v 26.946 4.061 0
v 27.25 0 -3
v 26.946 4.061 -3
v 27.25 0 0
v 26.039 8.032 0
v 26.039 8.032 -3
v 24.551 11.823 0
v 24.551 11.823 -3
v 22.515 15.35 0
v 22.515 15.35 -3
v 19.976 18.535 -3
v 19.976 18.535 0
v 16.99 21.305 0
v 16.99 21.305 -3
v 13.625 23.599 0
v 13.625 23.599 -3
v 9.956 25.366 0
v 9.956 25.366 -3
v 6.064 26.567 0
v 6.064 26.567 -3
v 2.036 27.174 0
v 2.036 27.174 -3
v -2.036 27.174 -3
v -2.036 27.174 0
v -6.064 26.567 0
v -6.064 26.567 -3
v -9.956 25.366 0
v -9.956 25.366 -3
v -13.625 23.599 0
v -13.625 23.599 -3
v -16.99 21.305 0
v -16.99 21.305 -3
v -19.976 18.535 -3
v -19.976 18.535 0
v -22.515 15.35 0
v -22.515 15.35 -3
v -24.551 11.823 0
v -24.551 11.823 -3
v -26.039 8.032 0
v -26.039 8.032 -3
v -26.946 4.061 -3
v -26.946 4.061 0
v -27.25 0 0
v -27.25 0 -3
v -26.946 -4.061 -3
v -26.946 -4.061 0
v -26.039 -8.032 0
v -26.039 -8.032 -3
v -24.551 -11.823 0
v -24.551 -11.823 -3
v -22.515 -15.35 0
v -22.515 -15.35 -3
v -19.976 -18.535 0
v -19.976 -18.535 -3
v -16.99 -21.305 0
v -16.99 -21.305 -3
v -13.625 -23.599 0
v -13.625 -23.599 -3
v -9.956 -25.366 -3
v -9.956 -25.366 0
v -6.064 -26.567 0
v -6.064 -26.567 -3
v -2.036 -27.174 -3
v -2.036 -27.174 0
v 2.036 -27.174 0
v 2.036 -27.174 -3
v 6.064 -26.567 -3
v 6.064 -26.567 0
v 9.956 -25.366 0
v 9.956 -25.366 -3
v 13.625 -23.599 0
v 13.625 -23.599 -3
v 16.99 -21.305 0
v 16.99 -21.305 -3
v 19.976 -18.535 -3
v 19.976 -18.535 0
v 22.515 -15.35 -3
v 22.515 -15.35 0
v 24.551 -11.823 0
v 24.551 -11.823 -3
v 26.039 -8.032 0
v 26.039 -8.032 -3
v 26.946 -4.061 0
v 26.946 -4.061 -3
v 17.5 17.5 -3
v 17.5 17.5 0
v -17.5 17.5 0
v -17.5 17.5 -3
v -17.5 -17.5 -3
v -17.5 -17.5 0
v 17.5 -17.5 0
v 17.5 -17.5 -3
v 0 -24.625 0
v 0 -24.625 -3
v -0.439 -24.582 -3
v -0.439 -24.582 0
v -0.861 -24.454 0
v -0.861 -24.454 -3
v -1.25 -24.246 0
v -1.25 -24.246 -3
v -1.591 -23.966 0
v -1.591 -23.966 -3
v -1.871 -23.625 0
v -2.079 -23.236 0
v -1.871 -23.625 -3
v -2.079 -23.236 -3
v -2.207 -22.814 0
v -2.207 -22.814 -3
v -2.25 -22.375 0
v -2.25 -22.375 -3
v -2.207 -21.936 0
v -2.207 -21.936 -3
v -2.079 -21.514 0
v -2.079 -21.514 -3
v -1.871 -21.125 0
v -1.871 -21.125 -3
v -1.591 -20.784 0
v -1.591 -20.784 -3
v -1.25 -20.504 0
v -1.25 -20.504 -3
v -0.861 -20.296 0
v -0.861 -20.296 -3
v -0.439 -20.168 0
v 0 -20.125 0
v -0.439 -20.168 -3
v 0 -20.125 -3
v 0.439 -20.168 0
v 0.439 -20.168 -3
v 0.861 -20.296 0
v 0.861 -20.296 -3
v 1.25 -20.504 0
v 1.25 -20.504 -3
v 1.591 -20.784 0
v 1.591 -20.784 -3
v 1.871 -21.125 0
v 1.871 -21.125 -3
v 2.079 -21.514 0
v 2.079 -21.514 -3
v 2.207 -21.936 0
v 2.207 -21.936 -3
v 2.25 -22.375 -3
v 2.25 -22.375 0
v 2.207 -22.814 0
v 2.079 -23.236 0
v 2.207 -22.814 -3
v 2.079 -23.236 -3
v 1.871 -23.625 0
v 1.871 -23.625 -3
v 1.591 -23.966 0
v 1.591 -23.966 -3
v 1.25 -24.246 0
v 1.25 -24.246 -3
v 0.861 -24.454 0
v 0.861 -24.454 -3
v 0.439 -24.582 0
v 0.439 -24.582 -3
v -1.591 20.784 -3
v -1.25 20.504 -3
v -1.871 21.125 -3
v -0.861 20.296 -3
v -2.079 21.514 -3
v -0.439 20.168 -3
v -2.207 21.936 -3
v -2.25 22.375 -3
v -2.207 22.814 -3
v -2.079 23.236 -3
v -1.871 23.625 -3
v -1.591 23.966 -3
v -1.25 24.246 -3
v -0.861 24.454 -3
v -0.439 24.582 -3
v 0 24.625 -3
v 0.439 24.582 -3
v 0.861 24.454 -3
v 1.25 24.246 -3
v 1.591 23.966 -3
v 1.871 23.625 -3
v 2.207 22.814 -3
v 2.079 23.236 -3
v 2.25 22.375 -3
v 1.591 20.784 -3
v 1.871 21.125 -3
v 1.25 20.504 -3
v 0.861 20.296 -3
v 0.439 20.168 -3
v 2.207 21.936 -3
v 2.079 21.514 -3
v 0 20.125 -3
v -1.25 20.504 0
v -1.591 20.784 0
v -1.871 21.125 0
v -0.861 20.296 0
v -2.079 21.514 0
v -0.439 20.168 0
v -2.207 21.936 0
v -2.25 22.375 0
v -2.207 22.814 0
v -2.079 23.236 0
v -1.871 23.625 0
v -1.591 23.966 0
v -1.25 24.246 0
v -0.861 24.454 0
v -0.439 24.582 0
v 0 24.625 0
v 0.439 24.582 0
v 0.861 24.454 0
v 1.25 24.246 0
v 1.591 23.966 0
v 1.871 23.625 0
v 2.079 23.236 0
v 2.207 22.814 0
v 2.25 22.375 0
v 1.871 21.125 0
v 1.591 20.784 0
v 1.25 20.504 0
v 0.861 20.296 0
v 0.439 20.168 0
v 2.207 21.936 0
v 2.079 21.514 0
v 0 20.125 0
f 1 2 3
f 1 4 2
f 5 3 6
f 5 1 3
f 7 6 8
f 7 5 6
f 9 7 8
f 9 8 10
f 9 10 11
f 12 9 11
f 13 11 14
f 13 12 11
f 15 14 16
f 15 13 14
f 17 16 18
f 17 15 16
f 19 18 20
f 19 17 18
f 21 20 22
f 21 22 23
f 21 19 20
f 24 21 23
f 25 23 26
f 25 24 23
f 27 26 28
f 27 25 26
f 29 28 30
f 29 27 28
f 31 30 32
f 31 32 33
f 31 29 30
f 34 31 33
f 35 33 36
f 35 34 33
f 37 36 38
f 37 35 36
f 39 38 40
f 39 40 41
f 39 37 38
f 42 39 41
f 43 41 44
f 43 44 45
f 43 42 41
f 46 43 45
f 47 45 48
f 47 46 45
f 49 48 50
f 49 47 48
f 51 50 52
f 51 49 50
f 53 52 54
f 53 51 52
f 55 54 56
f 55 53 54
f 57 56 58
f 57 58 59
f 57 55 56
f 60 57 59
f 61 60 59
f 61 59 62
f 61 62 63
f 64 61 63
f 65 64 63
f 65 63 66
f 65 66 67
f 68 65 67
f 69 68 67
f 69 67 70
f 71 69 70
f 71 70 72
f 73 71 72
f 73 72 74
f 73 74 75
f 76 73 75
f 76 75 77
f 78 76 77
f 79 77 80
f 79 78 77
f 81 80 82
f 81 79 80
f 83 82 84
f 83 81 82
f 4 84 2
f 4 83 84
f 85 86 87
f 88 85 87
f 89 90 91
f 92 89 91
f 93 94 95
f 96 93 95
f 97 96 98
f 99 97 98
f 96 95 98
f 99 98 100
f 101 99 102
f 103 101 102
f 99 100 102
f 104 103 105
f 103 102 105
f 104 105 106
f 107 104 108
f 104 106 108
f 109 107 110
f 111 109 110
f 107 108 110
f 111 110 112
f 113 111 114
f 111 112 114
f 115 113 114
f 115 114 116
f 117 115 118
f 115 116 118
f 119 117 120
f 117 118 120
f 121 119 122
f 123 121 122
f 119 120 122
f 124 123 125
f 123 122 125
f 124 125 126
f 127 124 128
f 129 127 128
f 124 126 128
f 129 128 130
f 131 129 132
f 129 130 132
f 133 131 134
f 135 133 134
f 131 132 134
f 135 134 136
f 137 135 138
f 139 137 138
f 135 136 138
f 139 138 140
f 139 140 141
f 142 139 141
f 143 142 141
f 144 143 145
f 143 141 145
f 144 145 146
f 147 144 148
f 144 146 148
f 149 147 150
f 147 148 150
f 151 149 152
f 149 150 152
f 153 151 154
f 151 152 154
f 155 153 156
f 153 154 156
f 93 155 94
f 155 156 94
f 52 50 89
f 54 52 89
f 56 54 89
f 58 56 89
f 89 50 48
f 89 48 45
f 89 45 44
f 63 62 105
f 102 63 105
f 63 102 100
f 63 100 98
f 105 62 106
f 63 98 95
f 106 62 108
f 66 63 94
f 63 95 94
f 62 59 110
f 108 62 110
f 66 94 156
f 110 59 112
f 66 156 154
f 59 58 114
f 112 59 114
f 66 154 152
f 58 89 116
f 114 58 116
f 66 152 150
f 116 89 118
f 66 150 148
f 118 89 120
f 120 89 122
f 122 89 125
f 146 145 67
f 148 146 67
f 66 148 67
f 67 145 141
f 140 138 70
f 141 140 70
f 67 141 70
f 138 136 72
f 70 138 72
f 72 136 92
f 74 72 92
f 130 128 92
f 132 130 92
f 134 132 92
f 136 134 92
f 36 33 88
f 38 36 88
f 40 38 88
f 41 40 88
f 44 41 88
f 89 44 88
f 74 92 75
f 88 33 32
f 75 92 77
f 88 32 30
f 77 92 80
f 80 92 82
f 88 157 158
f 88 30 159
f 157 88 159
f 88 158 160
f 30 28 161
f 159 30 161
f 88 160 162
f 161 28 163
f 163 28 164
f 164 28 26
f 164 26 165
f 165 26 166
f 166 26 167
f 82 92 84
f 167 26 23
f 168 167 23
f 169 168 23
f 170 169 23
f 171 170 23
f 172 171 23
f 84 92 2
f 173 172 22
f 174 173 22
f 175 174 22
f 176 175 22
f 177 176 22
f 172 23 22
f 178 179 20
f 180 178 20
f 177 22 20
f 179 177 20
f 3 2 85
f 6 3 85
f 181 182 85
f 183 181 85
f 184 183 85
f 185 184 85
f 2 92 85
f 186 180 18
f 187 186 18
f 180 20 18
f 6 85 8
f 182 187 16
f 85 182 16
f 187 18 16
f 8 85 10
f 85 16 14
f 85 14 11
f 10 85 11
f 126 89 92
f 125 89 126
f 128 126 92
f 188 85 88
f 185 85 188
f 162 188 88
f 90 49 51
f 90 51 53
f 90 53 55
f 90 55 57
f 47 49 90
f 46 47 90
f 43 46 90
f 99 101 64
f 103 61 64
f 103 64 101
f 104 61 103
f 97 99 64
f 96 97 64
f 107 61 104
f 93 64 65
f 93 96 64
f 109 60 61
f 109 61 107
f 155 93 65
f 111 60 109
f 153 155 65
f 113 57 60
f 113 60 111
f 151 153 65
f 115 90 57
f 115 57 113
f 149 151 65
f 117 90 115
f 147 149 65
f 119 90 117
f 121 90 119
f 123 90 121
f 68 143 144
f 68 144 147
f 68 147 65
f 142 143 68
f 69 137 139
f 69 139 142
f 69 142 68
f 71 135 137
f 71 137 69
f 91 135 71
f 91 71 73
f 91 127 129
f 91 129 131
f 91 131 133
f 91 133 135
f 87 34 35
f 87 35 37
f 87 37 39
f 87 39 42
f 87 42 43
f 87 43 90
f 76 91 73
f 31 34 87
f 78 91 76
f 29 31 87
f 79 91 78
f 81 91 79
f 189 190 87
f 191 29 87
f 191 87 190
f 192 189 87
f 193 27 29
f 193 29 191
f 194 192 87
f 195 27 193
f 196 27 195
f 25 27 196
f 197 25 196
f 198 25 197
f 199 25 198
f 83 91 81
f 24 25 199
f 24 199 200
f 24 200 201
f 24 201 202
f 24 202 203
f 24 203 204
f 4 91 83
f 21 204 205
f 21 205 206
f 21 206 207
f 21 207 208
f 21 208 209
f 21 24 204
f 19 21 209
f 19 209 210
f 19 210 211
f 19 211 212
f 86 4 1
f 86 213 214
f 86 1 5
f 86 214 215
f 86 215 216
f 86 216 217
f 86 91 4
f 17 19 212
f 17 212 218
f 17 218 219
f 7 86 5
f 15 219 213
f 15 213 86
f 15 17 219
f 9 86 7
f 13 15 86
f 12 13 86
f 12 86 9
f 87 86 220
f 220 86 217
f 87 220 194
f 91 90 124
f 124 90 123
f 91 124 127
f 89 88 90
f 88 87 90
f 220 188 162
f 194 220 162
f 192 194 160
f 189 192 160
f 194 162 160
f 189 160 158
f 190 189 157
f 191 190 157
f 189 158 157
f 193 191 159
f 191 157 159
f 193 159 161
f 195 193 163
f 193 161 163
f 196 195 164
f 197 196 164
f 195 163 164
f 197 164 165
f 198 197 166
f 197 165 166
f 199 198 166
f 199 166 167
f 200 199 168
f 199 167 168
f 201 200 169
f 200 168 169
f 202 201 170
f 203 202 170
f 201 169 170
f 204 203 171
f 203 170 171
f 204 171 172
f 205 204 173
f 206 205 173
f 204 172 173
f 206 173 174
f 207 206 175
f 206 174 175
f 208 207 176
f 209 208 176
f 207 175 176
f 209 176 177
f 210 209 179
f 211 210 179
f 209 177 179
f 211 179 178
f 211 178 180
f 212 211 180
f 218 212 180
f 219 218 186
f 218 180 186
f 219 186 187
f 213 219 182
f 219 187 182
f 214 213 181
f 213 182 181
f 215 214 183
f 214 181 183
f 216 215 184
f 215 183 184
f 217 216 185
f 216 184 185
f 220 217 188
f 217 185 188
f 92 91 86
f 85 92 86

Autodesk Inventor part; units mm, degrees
ref_plane "YZ Plane" through (0, 0, 0) normal (1, 0, 0) x (0, 1, 0)
ref_plane "XZ Plane" through (0, 0, 0) normal (0, 1, 0) x (-1, 0, 0)
ref_plane "XY Plane" through (0, 0, 0) normal (0, 0, 1) x (1, 0, 0)
sketch "スケッチ1" plane through (0, 0, 0) normal (0, 0, 1) x (1, 0, 0)
  circle A0 centre (0, 0) radius 27.25
  line L0 (17.5, 17.5) -> (-17.5, 17.5)
  line L1 (-17.5, 17.5) -> (-17.5, -17.5)
  line L2 (-17.5, -17.5) -> (17.5, -17.5)
  line L3 (17.5, -17.5) -> (17.5, 17.5)
  line L4 (17.5, 17.5) -> (-17.5, -17.5) construction
  line L5 (-17.5, 17.5) -> (17.5, -17.5) construction
  line L6 (1, 17.5) -> (-1, 17.5)
  line L7 (-1, -17.5) -> (1, -17.5)
  dimension "d0" = 54.5
  dimension "d6" = 35
  dimension "d107" = 2
  dimension "d108" = 35
extrude "押し出し1" add sketch "スケッチ1" against normal blind 3
sketch "スケッチ8" plane through (0, 0, 0) normal (0, 0, 1) x (1, 0, 0)
  circle A0 centre (0, 0) radius 27.25
  circle A1 centre (0, 0) radius 22.375
  line L0 (0, 30.4962) -> (0, -31.0616)
  point P0 (0, 0)
  point P1 (0, 22.375)
  point P2 (0, -22.375)
  dimension "d111" = 44.75
  dimension "d112" = 54.5
hole "穴5" at (0, 22.375, 0) at (0, -22.375, 0) direction (0, 0, -1) diameter 4.5 end through all clearance for "Countersunk Flat Head Screw ISO 2009/7046" size "M4" standard "ISO"
properties part number "Part3_A_Y" material "鋼、軟鋼"
